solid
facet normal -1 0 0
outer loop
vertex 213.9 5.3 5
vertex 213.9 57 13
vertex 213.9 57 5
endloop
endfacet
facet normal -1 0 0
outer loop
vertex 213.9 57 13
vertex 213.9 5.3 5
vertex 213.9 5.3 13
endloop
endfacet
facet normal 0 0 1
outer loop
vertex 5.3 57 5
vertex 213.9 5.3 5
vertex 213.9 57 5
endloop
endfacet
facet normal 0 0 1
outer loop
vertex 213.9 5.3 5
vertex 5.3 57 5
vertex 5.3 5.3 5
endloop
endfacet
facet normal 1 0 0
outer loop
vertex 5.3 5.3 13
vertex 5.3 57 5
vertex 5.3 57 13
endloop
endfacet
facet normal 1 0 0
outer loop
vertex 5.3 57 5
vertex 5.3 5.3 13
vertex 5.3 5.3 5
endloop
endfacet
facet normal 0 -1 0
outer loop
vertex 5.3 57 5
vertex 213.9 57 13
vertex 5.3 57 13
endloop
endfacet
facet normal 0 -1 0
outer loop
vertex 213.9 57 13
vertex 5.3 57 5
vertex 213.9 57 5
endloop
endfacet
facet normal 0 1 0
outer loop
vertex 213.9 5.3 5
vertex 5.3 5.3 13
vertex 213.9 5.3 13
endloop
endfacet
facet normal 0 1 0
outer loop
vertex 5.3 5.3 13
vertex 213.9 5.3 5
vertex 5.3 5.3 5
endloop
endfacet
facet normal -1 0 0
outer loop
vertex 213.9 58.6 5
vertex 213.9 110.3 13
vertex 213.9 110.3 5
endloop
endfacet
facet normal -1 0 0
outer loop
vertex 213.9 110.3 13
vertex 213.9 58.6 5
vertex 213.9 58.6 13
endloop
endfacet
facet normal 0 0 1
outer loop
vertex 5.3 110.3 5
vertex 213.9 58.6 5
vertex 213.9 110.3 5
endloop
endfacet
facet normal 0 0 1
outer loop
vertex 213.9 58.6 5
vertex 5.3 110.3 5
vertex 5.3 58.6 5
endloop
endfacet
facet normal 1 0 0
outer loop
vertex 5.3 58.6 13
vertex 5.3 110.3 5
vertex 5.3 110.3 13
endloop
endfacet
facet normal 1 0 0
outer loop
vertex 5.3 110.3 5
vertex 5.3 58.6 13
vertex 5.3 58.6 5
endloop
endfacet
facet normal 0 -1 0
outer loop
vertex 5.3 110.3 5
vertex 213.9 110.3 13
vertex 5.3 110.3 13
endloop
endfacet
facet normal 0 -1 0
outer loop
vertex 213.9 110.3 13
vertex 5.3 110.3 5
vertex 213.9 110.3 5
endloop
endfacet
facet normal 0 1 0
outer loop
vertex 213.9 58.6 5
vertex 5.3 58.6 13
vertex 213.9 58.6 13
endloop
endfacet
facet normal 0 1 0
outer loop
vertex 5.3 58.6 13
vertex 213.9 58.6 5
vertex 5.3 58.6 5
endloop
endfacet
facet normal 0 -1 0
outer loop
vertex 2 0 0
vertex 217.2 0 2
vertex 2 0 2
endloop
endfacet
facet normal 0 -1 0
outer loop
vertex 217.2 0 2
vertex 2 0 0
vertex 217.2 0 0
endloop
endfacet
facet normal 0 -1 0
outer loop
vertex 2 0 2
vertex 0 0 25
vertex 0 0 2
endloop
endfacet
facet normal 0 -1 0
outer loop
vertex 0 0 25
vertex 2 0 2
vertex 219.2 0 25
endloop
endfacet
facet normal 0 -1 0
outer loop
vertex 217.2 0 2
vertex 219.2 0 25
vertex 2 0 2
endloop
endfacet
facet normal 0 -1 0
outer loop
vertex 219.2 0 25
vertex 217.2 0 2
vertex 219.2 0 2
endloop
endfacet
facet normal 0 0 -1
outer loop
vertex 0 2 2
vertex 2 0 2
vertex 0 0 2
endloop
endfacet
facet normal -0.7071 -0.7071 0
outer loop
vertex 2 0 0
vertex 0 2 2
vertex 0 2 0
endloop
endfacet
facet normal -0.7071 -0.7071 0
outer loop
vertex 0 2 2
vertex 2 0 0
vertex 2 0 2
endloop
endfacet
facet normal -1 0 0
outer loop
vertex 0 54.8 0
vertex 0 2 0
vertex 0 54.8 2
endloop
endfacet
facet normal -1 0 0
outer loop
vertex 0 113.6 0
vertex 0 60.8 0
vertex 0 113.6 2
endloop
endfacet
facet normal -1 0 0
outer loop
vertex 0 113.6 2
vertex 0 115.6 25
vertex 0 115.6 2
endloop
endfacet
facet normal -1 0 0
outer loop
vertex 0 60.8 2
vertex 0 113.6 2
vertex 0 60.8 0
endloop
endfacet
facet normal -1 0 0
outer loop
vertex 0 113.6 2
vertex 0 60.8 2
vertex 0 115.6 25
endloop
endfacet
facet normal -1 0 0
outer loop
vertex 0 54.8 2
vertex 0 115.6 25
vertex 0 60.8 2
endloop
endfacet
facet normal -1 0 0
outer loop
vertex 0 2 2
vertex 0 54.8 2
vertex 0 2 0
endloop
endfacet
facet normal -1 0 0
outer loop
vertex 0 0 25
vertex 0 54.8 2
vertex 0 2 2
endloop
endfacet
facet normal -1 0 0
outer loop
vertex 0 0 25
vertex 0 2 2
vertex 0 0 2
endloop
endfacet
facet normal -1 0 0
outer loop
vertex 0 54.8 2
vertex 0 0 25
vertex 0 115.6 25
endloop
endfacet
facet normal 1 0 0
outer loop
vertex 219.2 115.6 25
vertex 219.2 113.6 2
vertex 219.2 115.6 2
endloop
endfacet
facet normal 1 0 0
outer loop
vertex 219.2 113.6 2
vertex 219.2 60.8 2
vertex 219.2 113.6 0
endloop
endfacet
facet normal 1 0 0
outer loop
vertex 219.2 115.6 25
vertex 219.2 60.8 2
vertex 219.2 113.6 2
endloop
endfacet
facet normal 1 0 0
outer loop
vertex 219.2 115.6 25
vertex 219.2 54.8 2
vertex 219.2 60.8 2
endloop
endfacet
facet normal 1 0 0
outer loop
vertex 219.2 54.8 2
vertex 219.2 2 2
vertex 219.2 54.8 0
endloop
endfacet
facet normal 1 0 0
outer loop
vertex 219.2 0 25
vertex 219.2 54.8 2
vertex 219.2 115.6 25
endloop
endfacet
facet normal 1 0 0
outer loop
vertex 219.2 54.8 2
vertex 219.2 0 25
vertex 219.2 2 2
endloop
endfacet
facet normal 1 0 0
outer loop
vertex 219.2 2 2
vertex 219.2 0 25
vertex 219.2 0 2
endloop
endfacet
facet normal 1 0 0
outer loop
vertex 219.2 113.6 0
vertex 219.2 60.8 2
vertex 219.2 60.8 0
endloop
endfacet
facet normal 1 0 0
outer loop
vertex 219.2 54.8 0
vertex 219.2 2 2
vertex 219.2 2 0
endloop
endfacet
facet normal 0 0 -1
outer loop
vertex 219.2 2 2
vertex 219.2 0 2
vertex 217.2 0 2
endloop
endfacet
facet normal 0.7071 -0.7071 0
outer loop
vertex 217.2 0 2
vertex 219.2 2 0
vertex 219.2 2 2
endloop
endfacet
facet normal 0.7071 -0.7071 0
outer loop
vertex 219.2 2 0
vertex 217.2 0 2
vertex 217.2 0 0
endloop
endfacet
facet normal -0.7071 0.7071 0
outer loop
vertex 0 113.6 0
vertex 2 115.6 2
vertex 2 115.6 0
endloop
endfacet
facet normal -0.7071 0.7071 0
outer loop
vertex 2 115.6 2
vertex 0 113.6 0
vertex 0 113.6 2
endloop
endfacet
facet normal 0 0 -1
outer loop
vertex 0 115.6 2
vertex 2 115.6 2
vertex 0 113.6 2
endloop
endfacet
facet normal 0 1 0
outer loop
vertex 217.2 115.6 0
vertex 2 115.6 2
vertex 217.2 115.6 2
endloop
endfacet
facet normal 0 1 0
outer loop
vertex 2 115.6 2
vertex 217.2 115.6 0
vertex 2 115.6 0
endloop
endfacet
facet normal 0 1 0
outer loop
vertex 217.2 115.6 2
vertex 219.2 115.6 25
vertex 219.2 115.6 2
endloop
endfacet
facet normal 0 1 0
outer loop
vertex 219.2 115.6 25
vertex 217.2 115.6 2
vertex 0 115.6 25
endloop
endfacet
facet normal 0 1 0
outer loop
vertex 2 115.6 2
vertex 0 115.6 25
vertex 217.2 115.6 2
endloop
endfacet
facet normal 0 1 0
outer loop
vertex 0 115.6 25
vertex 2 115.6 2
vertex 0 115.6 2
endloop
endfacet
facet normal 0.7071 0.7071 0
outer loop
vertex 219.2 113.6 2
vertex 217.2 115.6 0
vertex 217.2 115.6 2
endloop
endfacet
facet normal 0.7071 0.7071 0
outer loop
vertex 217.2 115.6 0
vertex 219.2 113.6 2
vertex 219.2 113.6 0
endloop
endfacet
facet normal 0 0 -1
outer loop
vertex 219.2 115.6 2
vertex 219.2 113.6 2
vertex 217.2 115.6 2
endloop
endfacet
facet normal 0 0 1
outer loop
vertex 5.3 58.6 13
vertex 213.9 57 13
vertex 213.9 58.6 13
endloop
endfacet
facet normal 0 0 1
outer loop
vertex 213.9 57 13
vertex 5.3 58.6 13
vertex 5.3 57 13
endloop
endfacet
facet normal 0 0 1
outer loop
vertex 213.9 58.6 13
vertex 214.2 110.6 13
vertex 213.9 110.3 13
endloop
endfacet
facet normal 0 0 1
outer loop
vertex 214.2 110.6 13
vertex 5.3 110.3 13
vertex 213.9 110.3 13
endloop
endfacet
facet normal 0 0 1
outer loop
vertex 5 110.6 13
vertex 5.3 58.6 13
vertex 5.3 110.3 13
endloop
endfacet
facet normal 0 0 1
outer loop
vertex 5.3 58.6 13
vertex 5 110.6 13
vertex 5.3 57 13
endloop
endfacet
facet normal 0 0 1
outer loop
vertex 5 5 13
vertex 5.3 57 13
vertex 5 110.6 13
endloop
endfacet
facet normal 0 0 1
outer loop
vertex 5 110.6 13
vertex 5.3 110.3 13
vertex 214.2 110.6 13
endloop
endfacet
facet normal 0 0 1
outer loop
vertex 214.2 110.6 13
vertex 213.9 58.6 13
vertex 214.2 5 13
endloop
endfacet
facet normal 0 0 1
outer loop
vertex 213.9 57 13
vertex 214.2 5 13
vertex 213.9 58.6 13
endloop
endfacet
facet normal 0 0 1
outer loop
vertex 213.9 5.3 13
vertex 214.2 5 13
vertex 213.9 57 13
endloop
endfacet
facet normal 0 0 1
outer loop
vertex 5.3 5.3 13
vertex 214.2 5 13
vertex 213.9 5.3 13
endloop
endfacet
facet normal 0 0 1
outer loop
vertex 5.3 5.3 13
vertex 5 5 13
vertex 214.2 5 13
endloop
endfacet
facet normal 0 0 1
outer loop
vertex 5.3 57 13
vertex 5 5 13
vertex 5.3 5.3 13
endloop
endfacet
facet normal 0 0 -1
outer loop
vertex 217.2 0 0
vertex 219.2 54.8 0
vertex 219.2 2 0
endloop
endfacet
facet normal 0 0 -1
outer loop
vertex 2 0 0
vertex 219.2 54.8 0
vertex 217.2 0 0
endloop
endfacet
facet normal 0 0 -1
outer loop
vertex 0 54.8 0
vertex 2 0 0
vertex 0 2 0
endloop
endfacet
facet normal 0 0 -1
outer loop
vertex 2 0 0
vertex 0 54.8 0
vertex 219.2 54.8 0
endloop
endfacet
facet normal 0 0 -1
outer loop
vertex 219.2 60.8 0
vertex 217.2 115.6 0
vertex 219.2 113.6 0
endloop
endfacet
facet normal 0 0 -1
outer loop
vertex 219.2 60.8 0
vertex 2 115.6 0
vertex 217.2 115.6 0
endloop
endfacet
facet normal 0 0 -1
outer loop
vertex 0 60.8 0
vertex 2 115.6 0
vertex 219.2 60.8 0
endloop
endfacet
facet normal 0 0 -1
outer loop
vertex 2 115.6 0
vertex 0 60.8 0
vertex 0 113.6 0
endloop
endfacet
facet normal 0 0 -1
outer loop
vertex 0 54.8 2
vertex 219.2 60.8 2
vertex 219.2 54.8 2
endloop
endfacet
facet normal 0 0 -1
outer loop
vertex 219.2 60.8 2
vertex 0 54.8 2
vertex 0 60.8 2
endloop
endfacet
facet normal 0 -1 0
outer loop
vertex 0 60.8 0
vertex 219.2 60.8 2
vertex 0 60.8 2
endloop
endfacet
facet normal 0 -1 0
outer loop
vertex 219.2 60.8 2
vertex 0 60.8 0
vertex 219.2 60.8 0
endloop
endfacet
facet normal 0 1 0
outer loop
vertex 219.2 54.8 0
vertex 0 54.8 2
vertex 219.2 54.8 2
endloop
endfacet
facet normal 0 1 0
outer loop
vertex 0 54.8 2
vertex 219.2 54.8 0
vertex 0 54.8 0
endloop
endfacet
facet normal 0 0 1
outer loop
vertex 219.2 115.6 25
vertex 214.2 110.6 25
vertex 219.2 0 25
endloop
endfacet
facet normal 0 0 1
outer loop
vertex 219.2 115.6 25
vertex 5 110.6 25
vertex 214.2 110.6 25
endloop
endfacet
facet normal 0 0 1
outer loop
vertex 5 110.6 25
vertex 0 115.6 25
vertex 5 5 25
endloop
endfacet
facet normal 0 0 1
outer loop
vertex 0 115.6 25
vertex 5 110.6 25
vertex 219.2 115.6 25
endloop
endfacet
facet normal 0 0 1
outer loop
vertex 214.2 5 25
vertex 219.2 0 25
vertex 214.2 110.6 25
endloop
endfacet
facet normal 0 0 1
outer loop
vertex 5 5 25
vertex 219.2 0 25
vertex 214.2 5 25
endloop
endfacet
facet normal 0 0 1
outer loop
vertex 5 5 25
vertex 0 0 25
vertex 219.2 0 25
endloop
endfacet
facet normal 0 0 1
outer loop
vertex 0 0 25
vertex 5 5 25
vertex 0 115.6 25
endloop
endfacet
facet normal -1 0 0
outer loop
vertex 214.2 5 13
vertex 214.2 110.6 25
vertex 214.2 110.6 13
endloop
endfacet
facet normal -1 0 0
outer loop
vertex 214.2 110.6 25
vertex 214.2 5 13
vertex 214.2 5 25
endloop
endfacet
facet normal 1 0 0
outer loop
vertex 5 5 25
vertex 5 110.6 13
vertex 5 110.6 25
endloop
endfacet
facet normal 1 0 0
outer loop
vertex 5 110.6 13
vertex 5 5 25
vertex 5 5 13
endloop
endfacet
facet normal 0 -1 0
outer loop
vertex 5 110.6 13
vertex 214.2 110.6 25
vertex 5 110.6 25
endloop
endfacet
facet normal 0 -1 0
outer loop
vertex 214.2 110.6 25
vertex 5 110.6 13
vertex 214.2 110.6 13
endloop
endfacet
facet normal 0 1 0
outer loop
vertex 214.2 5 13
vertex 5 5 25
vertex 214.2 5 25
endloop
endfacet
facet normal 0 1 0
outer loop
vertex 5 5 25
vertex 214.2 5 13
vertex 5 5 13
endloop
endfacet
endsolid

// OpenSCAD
// WheresDat — Parametric Sortimo T-Boxx-compatible small-parts tray
//
// Grid module verified against the specific product this targets —
// Sortimo T-Boxx 2018 insert boxes: confirmed grid pitch 52.3mm (not the
// 52mm originally sourced from a general L-BOXX search — close, but a
// real product-specific correction, not a rounding choice). T-Boxx
// heights run H31/H63; unused here regardless, see below.
//
// NOT verified / deliberately simplified: Bosch's actual snap/latch
// retention profile. I don't have real tolerances for their proprietary
// rail-and-latch mechanism, so this design uses a plain recessed pocket
// with a shallow lip instead of replicating their exact latch geometry.
// Print ONE pocket first and test-fit a real box before committing to a
// full tray — the raster spacing (52.3mm grid) should now be correct for
// T-Boxx specifically, but the retention feel will be looser than a
// genuine Sortimo click-fit.
//
// This file is written to be actually parametric: edit the values below
// (openscad-customizer compatible) rather than the geometry itself.

/* [Printer] */
// Actual build volume (300x300x330mm). Z isn't used by this flat-tray
// design — plenty of headroom regardless — kept here for reference.
max_bed_x = 300; // mm
max_bed_y = 300; // mm
max_bed_z = 330; // mm, unused by this design, informational only

/* [Sortimo T-Boxx grid — verified against the real product] */
module_size    = 52.3; // mm, one grid unit (T-Boxx 2018 confirmed pitch)
box_height     = 63;   // mm, T-Boxx H63 variant (reference only, not used for pocket depth — see below)

/* [Tray construction] */
// Bumped up from the first draft: long unsupported walls print poorly
// (warping, weak layer adhesion along the run) — worse on a tray this
// large, not better. outer_wall_thickness is reinforced further since
// the tray's outer perimeter is the single longest unsupported run.
pocket_depth         = 8;   // mm, recess depth — shallow on purpose, this is a cubby not a full socket
// Narrowed 3 -> 2 -> 1mm (2026-09-22) to fit real store-bought clear
// boxes (52mm at the base, verified against the actual STL in CAD, not
// the bare formula — both 3mm and 2mm came up short, the latter by a
// confirmed, measured 1mm cut into the divider). 1mm was rejected once
// already as too thin on its own — accepted now only as PART of a
// combined fix together with tray_extra_width below, not as the sole
// answer. Divider is only 8mm tall (capped at pocket_depth, doesn't rise
// with outer_wall_height), which is the only reason 1mm is viable at
// all here rather than genuinely fragile.
wall_thickness       = 1;   // mm, internal divider wall between adjacent pockets
outer_wall_thickness = 5;   // mm, perimeter wall — thicker on purpose, it's the longest run
// Added 2026-09-22: the module_size grid pitch (52.3mm) is a verified
// real spec (T-Boxx) and isn't the thing to fudge for a same-shaped but
// different real-world box that just happens to not quite fit it. This
// instead grows the tray's own Y size directly, split evenly across the
// two stacked rows, independent of module_size — so length-axis
// compatibility (X, still real T-Boxx pitch) is untouched. Lands the
// channel width around 51.7mm against a 52mm box base — close but not
// zero-interference; verify the real fit before committing to a batch,
// same caveat as everything else in this file.
tray_extra_width     = 1;   // mm, total added to tray_y, split evenly across grid_rows
// Added 2026-09-08: the perimeter wall used to be the same height as
// the rest of the tray (tray_floor + pocket_depth, 13mm) — nowhere
// near tall enough for a label, and not doing much to hold boxes in
// laterally since most of a 25mm box's height stuck up above it
// unsupported. This raises the OUTER perimeter specifically, past the
// pocket tops, without touching pocket_depth (which still controls how
// deep boxes sit) — same outer_wall_thickness footprint, just taller.
outer_wall_height    = 25;  // mm, total height of the raised perimeter rim, measured from the base
fit_clearance        = 0.3; // mm, small per-side tolerance so a box drops in without binding (NOT a structural wall — see fix below)
// Bumped 3 -> 5 (2026-09-07) to make room for the spine channel below
// without cutting into the floor thickness that was already validated —
// 5mm floor minus a 2mm-deep channel still leaves the original 3mm of
// solid material underneath it.
tray_floor           = 5;   // mm, base plate thickness under the pockets

/* [Rigidity spine — bottom-side channel under each central divider] */
// Added 2026-09-07: as trays get longer (more modules end to end), a
// single divider wall organizes the boxes but doesn't by itself keep a
// long span from flexing — especially at a seam where two separately
// printed trays get placed together (see the layout note below). This
// cuts a channel into the underside, centered on each interior row
// divider and running the tray's full length, for a stiffening spine
// (printed strip, aluminum bar, etc.) inserted from below. Cross-section
// is a reasonable guess, NOT sourced from a specific spine material —
// verify against whatever stock you actually use before committing to a
// batch, same caveat as the pocket fit above.
spine_channel_enabled = true;
spine_channel_width   = 6;   // mm, channel width, centered on the divider
spine_channel_depth   = 2;   // mm, cut depth from the bottom face up into the floor

/* [Base chamfer — relieves corner curling on the print bed] */
// 2 x 45s instead of 1 sharp 90 at each base corner touching the plate
// — sharp corners concentrate cooling stress and curl/lift; this
// relieves the stress point instead of fighting it with more bed
// adhesion. Only the bottom chamfer_height, not a structural taper.
chamfer_size   = 2; // mm, cut along each edge meeting at the corner
chamfer_height = 2; // mm, how far up from the base the cut runs

/* [Layout — one row per box: [col, row, width_units, height_units]] */
// Changed from two 2x2 pockets to two 4x1 channels (2026-09-07): one
// central divider running the full long axis (the wall between row 0
// and row 1), splitting the tray into two open channels instead of a
// full grid of individually-walled cells. Each channel is one long
// pocket, 4 units end to end, with NO interior dividers — a run of
// separate boxes (hardware/sortimo_box.scad, now 1x1 through 4x1, width
// fixed to one channel) sits inside it, sized so a longer tool
// (screwdriver, pliers) can get an unbroken 3x1/4x1 box instead of being
// forced into a wall-bounded cell. Outer footprint was 219.2 x 114.6mm
// (print-validated) until tray_extra_width above grew Y by 1mm to
// 115.6mm (2026-09-22, for real store-bought box clearance) — re-verify
// shelf fit against 115.6mm, not the old number. Still a FULL tiling of its own 4x2
// bounding box (8 cells, all claimed) — if you edit this list yourself,
// watch for that: any grid cell inside the overall bounding box that no
// entry claims stays solid, uncut material.
boxes = [
    [0, 0, 4, 1],
    [0, 1, 4, 1],
];

// ---------------------------------------------------------------------
// Derived geometry — shouldn't need editing below this line
// ---------------------------------------------------------------------

grid_cols = max([for (b = boxes) b[0] + b[2]]);
grid_rows = max([for (b = boxes) b[1] + b[3]]);

// tray_extra_width split evenly across the row axis only — row_pitch is
// what a row-index actually advances by (module_size plus its share of
// the extra), kept separate from module_size itself since X/length still
// needs the real, unmodified T-Boxx pitch.
row_extra = tray_extra_width / grid_rows;
row_pitch = module_size + row_extra;

// Grid origin sits inset by outer_wall_thickness from the tray edge, so
// the perimeter is a full outer_wall_thickness regardless of grid size.
tray_x = grid_cols * module_size + outer_wall_thickness * 2;
tray_y = grid_rows * row_pitch + outer_wall_thickness * 2;
tray_z = tray_floor + pocket_depth;

assert(tray_x <= max_bed_x,
    str("Tray X (", tray_x, "mm) exceeds max_bed_x (", max_bed_x, "mm) — trim the layout or fix max_bed_x"));
assert(tray_y <= max_bed_y,
    str("Tray Y (", tray_y, "mm) exceeds max_bed_y (", max_bed_y, "mm) — trim the layout or fix max_bed_y"));
assert(!spine_channel_enabled || spine_channel_depth <= tray_floor - 1,
    str("spine_channel_depth (", spine_channel_depth, "mm) leaves less than 1mm of solid floor under a tray_floor of ", tray_floor, "mm — increase tray_floor or shrink spine_channel_depth"));

module base_chamfer_cut(width, depth, size, height) {
    corners = [[0, 0], [width, 0], [0, depth], [width, depth]];
    for (c = corners) {
        dx = (c[0] == 0) ? 1 : -1;
        dy = (c[1] == 0) ? 1 : -1;
        translate([c[0], c[1], -0.5])
            linear_extrude(height = height + 0.5)
                polygon([[0, 0], [dx * size, 0], [0, dy * size]]);
    }
}

// A ring/frame matching the existing outer_wall_thickness footprint,
// rising from the tray's current top surface up to outer_wall_height —
// same wall thickness continued taller, not a separate offset feature,
// so it sits flush with the wall below it.
module outer_wall_riser() {
    if (outer_wall_height > tray_z) {
        translate([0, 0, tray_z])
            difference() {
                cube([tray_x, tray_y, outer_wall_height - tray_z]);
                translate([outer_wall_thickness, outer_wall_thickness, -0.5])
                    cube([
                        tray_x - 2 * outer_wall_thickness,
                        tray_y - 2 * outer_wall_thickness,
                        outer_wall_height - tray_z + 1
                    ]);
            }
    }
}

module sortimo_tray() {
    union() {
    difference() {
        // Solid base slab
        cube([tray_x, tray_y, tray_z]);

        // One recessed pocket per box in the layout. A side gets the full
        // div_inset (wall_thickness/2 + fit_clearance) only where it
        // borders ANOTHER pocket — that's what actually leaves a full
        // wall_thickness of solid divider material between two adjacent
        // boxes. A side sitting at the grid's own outer edge (0 or
        // grid_cols/rows*module_size) borders the solid outer wall
        // directly instead, which needs no structural margin of its own —
        // fit_clearance alone is enough there. Fixed 2026-09-22: this used
        // div_inset on all four sides uniformly before, which (given the
        // boxes array fully tiles the grid, so every non-edge boundary is
        // guaranteed to border a neighbor) needlessly narrowed every
        // pocket's outer-facing edges by up to a full div_inset more than
        // necessary — measured as a real 1mm-per-channel intrusion into
        // the tray's upper opening once printed.
        for (b = boxes) {
            div_inset = wall_thickness / 2 + fit_clearance;
            // X stays on module_size (real T-Boxx pitch, untouched). Y
            // uses row_pitch so each row carries its share of
            // tray_extra_width — see tray_extra_width above.
            x0 = b[0] * module_size;
            y0 = b[1] * row_pitch;
            x1 = (b[0] + b[2]) * module_size;
            y1 = (b[1] + b[3]) * row_pitch;

            inset_west  = (x0 <= 0) ? fit_clearance : div_inset;
            inset_east  = (x1 >= grid_cols * module_size) ? fit_clearance : div_inset;
            inset_south = (y0 <= 0) ? fit_clearance : div_inset;
            inset_north = (y1 >= grid_rows * row_pitch) ? fit_clearance : div_inset;

            translate([
                outer_wall_thickness + x0 + inset_west,
                outer_wall_thickness + y0 + inset_south,
                tray_floor
            ])
            cube([
                (x1 - x0) - inset_west - inset_east,
                (y1 - y0) - inset_south - inset_north,
                pocket_depth + 1 // +1 so the cut clears the top face cleanly
            ]);
        }

        // Rigidity spine channel(s) — one per interior row boundary,
        // cut from the bottom face up into the floor only. Kept
        // shallower than tray_floor (asserted above) so it never
        // breaches a pocket above it.
        if (spine_channel_enabled) {
            for (r = [1 : grid_rows - 1]) {
                translate([
                    0,
                    outer_wall_thickness + r * row_pitch - spine_channel_width / 2,
                    -0.5
                ])
                cube([
                    tray_x,
                    spine_channel_width,
                    spine_channel_depth + 0.5 // +0.5 so the cut clears the bottom face cleanly
                ]);
            }
        }

        base_chamfer_cut(tray_x, tray_y, chamfer_size, chamfer_height);
    }
    outer_wall_riser();
    }
}

sortimo_tray();
